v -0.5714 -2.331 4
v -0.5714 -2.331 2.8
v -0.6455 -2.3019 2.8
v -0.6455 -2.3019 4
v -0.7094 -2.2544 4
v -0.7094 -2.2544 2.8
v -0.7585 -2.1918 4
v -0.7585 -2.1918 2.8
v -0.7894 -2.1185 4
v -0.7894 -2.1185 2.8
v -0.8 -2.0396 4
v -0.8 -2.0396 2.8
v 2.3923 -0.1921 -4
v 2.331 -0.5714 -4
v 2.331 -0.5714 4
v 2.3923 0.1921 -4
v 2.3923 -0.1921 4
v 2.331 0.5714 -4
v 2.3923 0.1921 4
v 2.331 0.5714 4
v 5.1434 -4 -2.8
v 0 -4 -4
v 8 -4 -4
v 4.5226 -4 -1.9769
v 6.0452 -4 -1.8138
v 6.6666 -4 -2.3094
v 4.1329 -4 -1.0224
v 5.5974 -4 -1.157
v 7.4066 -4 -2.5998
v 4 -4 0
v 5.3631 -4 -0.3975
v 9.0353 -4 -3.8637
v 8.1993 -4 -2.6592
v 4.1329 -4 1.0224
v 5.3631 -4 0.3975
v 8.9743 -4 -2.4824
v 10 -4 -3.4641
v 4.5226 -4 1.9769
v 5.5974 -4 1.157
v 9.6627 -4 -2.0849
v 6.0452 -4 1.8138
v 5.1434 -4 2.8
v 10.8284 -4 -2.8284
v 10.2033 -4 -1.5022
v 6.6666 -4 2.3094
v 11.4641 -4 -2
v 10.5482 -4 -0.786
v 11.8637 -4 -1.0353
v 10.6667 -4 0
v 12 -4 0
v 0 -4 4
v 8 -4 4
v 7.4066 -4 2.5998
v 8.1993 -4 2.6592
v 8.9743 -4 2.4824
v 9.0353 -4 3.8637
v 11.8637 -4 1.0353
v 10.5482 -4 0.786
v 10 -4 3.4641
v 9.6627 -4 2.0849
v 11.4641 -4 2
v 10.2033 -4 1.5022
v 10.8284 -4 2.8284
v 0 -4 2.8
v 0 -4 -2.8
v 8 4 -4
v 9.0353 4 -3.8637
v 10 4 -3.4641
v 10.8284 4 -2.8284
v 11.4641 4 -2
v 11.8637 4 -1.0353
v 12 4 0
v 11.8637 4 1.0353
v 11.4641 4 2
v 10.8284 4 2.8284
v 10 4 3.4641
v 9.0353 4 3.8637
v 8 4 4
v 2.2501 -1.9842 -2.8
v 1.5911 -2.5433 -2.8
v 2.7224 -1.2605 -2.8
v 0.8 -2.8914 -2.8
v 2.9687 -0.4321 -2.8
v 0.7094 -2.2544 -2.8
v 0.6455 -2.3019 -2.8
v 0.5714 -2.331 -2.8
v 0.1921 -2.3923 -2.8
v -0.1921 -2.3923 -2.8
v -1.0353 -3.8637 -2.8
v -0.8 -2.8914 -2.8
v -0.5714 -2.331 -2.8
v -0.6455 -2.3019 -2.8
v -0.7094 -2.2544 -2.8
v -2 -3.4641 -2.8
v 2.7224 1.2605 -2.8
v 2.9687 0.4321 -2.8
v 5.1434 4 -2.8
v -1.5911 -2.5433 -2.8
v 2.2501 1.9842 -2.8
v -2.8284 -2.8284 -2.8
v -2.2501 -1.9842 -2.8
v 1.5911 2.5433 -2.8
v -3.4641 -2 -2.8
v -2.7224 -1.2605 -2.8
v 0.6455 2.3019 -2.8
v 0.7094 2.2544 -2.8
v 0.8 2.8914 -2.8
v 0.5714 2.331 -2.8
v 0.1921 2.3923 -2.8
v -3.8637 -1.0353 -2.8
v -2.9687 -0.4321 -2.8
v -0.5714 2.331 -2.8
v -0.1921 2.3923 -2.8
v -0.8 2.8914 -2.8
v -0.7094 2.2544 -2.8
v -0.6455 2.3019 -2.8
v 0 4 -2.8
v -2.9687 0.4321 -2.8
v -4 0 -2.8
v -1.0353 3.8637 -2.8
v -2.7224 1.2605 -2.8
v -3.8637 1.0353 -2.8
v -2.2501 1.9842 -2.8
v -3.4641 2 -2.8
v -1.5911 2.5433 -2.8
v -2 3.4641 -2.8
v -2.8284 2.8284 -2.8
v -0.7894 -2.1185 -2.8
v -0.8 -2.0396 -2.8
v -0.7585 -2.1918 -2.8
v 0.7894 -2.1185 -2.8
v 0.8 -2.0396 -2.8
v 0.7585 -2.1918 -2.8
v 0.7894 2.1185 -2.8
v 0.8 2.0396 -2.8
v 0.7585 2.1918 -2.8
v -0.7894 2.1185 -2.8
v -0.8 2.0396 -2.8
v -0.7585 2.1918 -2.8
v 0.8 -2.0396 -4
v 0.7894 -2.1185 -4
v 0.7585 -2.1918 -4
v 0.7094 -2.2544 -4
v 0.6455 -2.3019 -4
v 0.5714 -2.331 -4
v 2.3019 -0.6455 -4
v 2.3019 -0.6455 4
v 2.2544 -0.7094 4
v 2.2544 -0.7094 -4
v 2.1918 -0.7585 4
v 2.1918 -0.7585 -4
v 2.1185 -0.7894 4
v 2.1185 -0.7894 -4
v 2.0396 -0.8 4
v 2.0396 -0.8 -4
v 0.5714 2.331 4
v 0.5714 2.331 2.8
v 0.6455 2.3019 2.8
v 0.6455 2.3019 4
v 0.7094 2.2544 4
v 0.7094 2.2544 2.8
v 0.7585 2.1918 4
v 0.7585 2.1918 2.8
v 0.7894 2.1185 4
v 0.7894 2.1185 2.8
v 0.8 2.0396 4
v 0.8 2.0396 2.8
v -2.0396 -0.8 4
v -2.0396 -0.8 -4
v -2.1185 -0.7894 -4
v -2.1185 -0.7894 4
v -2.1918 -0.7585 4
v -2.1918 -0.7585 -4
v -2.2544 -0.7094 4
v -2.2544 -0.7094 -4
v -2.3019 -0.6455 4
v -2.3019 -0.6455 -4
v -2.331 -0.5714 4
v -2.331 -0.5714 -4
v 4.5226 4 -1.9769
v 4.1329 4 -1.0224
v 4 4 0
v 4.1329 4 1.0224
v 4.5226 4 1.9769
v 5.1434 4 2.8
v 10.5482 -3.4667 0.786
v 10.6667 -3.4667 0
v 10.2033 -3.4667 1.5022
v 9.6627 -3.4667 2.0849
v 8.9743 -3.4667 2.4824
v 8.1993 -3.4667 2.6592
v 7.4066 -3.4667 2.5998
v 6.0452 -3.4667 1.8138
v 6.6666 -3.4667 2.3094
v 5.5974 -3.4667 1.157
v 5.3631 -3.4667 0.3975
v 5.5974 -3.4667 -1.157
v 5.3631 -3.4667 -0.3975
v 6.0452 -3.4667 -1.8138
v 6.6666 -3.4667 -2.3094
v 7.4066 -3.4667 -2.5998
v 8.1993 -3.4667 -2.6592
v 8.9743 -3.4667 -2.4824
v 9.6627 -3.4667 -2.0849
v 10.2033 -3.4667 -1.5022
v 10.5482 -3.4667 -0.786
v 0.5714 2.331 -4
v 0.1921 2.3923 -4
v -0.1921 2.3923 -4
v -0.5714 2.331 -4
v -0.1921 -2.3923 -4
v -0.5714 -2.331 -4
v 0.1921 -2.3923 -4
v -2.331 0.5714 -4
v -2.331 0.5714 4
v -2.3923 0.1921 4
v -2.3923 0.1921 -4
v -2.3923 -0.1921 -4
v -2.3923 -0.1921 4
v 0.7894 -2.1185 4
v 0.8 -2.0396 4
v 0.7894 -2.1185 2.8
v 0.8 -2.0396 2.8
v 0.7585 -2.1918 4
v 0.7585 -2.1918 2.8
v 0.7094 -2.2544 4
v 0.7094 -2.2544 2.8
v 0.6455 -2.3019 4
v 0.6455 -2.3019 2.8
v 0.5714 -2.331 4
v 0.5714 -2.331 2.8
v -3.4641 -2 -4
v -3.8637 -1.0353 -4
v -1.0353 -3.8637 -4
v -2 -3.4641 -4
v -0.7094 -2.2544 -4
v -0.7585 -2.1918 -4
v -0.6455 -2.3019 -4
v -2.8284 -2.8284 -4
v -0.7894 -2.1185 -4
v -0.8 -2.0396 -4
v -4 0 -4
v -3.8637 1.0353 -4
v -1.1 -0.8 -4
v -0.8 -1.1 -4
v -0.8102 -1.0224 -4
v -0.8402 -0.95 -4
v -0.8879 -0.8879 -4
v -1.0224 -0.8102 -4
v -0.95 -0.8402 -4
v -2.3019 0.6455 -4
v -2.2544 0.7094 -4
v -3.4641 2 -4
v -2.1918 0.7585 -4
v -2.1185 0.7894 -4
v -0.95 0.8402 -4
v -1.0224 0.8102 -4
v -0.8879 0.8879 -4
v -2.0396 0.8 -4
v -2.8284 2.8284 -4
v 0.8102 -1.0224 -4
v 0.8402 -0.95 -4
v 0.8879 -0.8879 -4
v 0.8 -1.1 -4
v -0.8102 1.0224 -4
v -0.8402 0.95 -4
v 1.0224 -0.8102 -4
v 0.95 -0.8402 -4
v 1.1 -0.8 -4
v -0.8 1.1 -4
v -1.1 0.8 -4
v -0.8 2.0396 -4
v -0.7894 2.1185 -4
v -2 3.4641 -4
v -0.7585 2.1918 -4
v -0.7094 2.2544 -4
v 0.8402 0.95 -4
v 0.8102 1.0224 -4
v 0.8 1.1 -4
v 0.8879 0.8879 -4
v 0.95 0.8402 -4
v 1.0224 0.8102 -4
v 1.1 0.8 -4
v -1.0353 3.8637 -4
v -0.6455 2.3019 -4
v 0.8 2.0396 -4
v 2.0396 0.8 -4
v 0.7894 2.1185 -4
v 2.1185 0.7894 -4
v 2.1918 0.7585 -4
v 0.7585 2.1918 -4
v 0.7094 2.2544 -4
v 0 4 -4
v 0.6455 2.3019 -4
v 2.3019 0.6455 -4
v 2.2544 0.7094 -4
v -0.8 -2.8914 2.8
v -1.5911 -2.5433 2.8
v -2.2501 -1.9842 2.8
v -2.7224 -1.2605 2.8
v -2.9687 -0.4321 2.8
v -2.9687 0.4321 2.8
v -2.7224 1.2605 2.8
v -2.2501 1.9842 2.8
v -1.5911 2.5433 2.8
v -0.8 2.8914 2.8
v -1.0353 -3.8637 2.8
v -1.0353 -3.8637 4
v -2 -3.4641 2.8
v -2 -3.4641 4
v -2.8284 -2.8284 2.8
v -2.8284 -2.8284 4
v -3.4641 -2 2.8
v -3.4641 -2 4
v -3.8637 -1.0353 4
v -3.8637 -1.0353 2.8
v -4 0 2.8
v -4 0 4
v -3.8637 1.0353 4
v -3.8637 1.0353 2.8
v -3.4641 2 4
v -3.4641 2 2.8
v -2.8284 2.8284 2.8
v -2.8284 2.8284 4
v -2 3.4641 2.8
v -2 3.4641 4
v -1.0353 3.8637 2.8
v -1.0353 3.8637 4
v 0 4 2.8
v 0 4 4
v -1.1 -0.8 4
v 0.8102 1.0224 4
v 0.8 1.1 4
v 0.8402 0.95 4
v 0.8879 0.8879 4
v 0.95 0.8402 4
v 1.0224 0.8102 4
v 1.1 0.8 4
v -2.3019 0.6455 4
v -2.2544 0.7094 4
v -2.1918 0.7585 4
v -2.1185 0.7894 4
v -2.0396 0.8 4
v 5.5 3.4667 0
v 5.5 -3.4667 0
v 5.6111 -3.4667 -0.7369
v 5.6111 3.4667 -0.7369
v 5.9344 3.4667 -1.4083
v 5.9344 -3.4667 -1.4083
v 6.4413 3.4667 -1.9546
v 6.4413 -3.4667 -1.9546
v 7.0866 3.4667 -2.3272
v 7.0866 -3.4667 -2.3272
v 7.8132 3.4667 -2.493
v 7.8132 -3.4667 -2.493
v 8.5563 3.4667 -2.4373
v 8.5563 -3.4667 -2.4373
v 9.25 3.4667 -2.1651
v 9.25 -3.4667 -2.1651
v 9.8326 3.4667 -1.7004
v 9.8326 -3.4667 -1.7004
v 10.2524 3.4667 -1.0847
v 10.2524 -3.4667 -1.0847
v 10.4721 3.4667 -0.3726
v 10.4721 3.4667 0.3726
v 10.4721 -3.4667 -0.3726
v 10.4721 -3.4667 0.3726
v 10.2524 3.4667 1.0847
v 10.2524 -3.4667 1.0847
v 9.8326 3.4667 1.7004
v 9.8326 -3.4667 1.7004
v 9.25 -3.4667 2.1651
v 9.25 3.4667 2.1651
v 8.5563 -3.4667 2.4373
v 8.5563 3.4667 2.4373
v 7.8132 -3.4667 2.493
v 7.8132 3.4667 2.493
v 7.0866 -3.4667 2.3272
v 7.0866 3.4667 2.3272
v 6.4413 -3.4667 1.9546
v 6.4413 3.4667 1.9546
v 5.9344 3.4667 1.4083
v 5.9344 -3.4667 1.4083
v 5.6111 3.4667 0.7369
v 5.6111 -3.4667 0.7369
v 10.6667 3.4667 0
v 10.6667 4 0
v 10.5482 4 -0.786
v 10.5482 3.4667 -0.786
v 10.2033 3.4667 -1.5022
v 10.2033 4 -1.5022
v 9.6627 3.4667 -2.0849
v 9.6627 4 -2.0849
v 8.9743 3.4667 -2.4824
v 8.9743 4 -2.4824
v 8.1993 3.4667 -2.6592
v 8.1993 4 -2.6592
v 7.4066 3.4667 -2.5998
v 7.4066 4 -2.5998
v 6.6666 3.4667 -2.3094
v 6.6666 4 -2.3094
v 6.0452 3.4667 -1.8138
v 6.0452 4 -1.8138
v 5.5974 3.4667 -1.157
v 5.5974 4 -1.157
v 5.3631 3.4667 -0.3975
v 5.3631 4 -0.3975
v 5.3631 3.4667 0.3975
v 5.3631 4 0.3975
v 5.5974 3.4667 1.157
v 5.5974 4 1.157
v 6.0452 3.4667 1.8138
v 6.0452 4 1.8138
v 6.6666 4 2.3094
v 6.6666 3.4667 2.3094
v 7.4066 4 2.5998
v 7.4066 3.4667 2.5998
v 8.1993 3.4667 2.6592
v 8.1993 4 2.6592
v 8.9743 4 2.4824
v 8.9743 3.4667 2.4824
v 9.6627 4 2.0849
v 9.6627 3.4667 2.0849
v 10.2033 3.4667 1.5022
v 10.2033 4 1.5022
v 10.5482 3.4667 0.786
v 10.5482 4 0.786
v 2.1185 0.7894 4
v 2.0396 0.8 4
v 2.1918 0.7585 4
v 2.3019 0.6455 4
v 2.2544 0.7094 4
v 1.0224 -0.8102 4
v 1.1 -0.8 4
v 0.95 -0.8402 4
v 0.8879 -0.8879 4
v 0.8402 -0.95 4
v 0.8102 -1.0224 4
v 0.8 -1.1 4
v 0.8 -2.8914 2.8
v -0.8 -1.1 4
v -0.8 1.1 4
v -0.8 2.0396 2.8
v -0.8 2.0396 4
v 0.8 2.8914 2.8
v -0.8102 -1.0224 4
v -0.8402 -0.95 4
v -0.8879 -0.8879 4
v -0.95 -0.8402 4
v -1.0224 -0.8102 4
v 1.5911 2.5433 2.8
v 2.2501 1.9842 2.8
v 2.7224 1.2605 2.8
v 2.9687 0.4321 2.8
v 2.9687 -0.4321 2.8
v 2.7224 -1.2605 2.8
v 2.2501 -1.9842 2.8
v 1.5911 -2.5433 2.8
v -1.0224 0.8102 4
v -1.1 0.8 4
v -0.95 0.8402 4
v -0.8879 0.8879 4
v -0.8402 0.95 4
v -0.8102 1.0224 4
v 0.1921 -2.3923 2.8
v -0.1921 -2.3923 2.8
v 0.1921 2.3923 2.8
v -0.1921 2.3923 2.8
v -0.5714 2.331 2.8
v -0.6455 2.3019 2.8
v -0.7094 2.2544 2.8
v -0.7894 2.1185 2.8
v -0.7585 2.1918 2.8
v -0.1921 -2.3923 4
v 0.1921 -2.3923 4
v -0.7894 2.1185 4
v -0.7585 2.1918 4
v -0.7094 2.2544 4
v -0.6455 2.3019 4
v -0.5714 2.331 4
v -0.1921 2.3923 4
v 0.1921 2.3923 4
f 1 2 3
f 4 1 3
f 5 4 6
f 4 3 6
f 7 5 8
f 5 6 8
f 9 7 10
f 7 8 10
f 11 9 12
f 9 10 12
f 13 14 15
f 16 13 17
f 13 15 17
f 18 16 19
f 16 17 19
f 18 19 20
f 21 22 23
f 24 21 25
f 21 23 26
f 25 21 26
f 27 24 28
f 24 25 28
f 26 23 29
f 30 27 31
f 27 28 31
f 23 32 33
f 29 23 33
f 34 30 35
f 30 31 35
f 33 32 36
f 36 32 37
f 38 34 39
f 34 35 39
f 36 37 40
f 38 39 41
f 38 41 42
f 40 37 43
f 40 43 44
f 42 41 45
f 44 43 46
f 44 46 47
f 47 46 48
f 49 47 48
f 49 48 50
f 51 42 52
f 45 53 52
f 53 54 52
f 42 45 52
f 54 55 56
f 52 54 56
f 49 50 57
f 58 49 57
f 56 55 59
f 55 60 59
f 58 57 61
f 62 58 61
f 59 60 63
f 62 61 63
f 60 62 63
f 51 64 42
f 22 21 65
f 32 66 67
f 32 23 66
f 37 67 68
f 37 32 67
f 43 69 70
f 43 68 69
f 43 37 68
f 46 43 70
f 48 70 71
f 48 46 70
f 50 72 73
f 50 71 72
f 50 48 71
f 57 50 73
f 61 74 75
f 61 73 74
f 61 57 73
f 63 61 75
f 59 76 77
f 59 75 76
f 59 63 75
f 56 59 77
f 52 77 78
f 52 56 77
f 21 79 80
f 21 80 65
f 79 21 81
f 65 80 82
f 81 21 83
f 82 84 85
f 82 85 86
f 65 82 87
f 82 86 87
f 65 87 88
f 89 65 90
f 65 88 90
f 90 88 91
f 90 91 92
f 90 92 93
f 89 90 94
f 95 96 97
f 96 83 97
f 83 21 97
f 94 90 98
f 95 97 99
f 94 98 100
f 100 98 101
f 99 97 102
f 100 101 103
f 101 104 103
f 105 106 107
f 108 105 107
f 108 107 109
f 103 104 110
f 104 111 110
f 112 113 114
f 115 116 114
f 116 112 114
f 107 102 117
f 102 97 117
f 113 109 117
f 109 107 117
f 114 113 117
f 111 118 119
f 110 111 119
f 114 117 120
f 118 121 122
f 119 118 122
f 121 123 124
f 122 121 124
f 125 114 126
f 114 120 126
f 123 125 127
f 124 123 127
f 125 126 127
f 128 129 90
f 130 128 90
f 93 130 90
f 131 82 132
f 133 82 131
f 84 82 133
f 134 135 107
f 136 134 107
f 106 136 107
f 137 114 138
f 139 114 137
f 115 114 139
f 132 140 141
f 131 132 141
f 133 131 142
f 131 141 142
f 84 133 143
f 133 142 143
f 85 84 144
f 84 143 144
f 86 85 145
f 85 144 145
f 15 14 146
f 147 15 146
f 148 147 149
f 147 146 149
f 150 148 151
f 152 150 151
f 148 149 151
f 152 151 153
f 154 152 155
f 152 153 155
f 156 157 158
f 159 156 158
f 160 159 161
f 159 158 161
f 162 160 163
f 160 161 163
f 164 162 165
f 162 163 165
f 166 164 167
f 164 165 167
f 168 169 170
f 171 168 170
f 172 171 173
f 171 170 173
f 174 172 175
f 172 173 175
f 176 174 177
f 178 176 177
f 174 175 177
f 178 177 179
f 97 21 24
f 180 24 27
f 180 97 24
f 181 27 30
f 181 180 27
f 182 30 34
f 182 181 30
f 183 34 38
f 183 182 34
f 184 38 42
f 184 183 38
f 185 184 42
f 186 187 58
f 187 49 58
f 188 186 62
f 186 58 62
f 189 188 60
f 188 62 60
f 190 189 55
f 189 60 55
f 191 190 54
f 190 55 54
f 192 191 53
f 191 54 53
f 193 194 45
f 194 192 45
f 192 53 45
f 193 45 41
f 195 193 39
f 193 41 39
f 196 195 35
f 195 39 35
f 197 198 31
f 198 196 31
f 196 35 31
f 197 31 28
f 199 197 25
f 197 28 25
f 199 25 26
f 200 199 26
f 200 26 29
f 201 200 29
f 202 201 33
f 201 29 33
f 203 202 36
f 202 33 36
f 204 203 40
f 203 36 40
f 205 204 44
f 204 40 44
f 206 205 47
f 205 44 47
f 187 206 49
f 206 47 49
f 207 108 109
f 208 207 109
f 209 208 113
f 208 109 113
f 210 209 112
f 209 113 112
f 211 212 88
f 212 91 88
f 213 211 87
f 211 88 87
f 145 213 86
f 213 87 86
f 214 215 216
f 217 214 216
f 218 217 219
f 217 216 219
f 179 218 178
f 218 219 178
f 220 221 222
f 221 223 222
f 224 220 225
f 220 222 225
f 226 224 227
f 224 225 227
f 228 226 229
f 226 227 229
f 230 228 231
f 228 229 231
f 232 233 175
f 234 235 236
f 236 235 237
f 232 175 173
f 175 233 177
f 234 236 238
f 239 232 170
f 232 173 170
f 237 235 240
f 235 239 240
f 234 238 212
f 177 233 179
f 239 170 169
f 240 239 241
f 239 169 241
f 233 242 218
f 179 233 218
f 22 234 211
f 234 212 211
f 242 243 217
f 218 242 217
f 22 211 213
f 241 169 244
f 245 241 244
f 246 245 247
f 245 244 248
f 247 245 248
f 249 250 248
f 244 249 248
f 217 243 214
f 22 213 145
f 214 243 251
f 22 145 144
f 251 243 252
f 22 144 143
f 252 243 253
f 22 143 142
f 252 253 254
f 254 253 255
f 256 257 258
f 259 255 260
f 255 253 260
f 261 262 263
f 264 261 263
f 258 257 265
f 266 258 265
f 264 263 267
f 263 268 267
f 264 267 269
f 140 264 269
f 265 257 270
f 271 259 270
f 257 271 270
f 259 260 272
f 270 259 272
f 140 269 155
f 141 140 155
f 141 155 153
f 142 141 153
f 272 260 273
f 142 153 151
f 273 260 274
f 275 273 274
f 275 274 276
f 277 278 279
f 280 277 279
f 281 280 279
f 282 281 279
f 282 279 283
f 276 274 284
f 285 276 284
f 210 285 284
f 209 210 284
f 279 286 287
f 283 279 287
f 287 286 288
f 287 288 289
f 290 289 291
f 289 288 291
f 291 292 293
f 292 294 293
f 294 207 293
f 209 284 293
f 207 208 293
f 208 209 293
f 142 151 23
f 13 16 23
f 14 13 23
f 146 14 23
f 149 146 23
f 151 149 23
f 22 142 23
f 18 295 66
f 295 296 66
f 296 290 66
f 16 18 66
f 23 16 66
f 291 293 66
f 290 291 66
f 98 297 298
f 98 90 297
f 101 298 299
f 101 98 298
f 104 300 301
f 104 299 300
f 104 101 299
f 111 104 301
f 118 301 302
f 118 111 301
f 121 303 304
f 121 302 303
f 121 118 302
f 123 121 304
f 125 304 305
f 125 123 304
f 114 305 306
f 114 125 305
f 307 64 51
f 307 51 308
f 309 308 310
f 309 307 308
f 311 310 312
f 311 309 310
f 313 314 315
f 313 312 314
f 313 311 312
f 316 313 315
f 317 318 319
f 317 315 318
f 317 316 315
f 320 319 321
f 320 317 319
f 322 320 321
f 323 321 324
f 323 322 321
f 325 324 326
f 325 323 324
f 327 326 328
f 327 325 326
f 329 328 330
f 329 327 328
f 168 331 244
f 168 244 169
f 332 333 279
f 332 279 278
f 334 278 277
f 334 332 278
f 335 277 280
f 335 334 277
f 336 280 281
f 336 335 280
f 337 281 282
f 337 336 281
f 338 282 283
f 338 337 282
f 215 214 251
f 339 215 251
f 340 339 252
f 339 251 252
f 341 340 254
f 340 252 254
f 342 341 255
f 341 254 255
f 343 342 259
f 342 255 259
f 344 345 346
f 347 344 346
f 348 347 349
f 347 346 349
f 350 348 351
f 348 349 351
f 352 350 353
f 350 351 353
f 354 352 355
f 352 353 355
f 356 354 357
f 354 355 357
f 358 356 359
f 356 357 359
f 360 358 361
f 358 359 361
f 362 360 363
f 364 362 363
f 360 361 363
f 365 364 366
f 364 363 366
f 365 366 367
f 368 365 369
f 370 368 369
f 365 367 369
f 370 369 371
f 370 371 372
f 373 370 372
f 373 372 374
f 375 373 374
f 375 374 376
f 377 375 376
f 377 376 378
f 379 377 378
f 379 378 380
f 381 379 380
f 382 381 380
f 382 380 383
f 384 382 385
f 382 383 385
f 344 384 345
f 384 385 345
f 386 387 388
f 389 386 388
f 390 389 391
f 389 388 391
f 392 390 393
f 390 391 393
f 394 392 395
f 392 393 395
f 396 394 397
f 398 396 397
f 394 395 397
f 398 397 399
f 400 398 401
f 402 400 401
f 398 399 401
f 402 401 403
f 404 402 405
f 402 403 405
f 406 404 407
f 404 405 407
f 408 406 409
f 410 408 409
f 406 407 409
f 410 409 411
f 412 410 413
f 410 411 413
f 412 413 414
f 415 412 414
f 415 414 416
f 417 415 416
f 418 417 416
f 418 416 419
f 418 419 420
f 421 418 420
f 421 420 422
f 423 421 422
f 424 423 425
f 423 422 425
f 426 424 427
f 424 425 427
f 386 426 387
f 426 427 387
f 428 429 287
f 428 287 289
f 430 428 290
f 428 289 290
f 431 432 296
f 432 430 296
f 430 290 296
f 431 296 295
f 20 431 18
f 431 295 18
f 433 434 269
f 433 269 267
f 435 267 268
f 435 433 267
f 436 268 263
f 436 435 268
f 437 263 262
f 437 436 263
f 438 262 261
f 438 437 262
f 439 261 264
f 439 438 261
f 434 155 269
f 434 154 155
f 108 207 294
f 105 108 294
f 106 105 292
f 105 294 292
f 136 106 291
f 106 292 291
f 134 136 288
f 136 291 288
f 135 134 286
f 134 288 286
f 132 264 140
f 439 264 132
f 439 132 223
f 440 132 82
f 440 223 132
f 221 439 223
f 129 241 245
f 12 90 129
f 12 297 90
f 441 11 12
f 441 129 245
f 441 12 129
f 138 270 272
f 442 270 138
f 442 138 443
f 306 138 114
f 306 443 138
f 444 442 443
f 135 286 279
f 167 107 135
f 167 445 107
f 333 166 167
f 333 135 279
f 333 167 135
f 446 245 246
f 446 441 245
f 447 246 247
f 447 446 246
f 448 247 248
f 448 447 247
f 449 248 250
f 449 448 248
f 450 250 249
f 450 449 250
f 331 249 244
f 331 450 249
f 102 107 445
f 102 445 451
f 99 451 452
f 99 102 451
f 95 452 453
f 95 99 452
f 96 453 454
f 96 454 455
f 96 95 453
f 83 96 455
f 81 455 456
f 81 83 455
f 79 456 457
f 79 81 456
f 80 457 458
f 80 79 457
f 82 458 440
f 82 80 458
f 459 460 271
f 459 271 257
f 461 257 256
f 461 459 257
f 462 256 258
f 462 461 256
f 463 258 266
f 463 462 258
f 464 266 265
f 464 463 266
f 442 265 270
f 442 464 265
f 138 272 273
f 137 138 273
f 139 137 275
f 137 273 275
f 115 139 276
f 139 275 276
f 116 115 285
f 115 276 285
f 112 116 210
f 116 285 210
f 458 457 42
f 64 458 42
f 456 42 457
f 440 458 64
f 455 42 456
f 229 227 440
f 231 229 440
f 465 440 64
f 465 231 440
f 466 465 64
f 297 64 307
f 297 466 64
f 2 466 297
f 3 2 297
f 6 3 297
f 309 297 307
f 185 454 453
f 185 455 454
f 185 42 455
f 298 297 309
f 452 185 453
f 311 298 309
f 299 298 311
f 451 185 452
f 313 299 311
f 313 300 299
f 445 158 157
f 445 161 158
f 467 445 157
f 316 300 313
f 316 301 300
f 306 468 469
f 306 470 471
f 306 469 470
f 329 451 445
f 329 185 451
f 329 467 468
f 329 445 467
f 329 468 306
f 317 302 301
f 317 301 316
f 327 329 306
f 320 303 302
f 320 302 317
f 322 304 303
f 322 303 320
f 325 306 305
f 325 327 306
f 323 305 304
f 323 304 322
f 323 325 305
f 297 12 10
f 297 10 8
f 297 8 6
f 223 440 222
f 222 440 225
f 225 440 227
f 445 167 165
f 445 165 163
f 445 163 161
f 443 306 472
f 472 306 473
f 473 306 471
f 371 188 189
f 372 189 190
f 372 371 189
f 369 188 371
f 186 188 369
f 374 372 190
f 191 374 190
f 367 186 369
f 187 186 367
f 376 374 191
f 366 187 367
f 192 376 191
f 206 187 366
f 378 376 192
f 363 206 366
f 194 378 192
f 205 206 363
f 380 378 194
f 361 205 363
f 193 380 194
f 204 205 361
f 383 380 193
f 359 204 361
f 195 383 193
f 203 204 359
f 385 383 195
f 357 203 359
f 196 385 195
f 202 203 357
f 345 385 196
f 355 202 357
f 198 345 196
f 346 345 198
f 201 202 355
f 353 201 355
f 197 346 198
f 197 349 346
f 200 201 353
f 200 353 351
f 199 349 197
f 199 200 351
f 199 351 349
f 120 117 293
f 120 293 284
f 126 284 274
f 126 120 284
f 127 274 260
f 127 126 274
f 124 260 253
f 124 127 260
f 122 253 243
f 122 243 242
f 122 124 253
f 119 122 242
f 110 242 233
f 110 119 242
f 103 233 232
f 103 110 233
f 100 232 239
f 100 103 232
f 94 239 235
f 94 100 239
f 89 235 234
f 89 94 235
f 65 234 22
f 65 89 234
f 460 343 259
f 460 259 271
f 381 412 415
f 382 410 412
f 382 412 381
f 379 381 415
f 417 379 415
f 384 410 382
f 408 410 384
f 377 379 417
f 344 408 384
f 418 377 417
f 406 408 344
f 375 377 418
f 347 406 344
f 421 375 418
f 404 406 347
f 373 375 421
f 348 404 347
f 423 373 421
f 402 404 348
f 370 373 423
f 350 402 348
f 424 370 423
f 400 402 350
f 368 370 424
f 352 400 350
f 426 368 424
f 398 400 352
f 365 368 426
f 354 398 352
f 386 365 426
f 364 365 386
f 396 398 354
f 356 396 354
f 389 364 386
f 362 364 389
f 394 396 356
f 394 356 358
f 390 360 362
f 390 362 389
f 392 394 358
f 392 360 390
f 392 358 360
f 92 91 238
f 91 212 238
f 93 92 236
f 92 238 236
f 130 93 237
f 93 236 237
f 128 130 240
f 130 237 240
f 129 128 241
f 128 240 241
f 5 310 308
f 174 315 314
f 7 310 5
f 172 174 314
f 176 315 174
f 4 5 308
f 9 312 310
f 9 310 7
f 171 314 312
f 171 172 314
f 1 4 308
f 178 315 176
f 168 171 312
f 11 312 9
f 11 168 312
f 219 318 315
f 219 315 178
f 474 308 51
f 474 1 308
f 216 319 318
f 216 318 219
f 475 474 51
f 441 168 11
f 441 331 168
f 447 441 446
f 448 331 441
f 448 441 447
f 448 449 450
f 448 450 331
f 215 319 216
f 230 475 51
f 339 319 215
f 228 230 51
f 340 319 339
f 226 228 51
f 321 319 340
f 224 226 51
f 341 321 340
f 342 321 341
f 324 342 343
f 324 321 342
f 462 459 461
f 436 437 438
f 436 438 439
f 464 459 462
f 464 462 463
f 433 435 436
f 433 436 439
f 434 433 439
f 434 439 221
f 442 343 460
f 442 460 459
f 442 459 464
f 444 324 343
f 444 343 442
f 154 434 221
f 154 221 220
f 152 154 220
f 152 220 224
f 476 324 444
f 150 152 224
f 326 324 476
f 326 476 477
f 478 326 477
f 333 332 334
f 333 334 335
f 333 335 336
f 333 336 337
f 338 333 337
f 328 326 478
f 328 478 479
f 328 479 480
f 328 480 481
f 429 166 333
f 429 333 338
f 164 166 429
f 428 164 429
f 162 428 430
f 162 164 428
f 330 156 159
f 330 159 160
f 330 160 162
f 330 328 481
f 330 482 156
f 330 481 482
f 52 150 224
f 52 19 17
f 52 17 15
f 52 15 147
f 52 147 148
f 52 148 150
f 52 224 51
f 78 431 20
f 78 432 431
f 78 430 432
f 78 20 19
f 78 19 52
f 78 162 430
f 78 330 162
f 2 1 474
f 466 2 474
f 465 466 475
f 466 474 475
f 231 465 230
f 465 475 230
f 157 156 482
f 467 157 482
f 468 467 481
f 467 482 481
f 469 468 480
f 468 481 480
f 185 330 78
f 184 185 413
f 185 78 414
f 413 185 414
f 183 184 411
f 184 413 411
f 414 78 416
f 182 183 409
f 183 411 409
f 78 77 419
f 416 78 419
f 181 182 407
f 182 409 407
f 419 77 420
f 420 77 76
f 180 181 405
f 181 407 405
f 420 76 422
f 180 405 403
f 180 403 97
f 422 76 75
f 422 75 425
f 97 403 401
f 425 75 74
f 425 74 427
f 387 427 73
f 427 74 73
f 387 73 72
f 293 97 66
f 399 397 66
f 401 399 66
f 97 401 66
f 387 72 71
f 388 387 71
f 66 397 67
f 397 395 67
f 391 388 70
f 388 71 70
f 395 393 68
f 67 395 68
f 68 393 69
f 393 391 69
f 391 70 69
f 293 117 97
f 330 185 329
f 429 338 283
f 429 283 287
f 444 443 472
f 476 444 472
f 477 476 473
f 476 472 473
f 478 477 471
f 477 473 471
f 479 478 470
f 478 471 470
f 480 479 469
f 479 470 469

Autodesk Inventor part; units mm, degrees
ref_plane "XZ Plane" through (0, 0, 0) normal (0, 1, 0) x (-1, 0, 0)
sketch "Sketch1" plane through (0, 0, 0) normal (0, 0, 1) x (1, 0, 0)
  circle A0 centre (0, 0) radius 4
  dimension "d0" = 8
extrude "Extrusion1" add sketch "Sketch1" along normal mid plane 8
sketch "Sketch2" plane through (0, 0, 4) normal (0, 0, 1) x (1, 0, 0)
  circle A0 centre (0, 0) radius 2.4
  line L0 (-2.2627, 0.8) -> (-0.8, 0.8)
  line L1 (-0.8, 0.8) -> (-0.8, 2.2627)
  line L2 (0.8, 2.2627) -> (0.8, 0.8)
  line L3 (0.8, 0.8) -> (2.2627, 0.8)
  line L4 (2.2627, -0.8) -> (0.8, -0.8)
  line L5 (0.8, -0.8) -> (0.8, -2.2627)
  line L6 (-0.8, -2.2627) -> (-0.8, -0.8)
  line L7 (-0.8, -0.8) -> (-2.2627, -0.8)
  dimension "d3" = 4.8
  dimension "d4" = 1.6
extrude "Extrusion2" cut sketch "Sketch2" against normal through all contours A0 L4 L5 L6 L7 L0 L1 L2 L3
ref_plane "Work Plane1" through (0, 0, -2.8) normal (0, 0, -1) x (-1, 0, 0)
sketch "Sketch3" plane through (0, 0, -2.8) normal (0, 0, -1) x (-1, 0, 0)
  circle A0 centre (0, 0) radius 4 projected
  circle A1 centre (0, 0) radius 4 projected
  circle A2 centre (0, 0) radius 3
  dimension "d8" = 6
extrude "Extrusion3" cut sketch "Sketch3" against normal blind 5.6
sketch "Sketch5" plane through (0, 0, 0) normal (0, 1, 0) x (-1, 0, 0)
  line L0 (-0.8, 4) -> (-0.8, -4) projected
  line L1 (0.8, 4) -> (0.8, -4) projected
  line L2 (4, 2.8) -> (-4, 2.8) projected
  line L3 (-0.8, -2.8) -> (0.8, -2.8)
  line L4 (0.8, -2.8) -> (0.8, 2.8)
  line L5 (0.8, 2.8) -> (-0.8, 2.8)
  line L6 (-0.8, 2.8) -> (-0.8, -2.8)
  point P0 (0, 0)
  point P1 (-1.518, -3.6)
  point P2 (4, -2.8)
  point P3 (4, -2.8)
extrude "Extrusion5" cut sketch "Sketch5" along normal through all both and the other way through all
fillet "Fillet1" radius 0.3 16 edges at (-0.8, 0.8, 0) (-0.8, -0.8, 0) (0.8, -0.8, 0) (0.8, 0.8, 0) (-2.2627, -0.8, 0) (-2.2627, 0.8, 0) (-0.8, 2.2627, 3.4) (0.8, 2.2627, 3.4) (2.2627, 0.8, 0) (2.2627, -0.8, 0) (0.8, -2.2627, 3.4) (-0.8, -2.2627, 3.4) (0.8, 2.2627, -3.4) (-0.8, 2.2627, -3.4) (0.8, -2.2627, -3.4) (-0.8, -2.2627, -3.4)
sketch "Sketch6" plane through (0, 0, 0) normal (0, 1, 0) x (-1, 0, 0)
  circle A0 centre (-8, 0) radius 2.5
  circle A1 centre (-8, 0) radius 4
  line L0 (-4, 2.8) -> (-4, 4)
  line L1 (-4, -4) -> (-4, -2.8)
  line L2 (-8, 4) -> (-8, -4) construction
  point P0 (0, 0)
  dimension "d22" = 5
  dimension "d23" = 8
  dimension "d24" = 8
extrude "Extrusion6" add sketch "Sketch6" along normal mid plane 8
sketch "Sketch7" plane through (8, 4, 0) normal (0, 1, 0) x (1, 0, 0)
  circle A0 centre (0, 0) radius 2.5 projected
  circle A1 centre (0, 0) radius 4 projected
  circle A2 centre (0, 0) radius 2.6667
  point P0 (-8, 0)
  dimension "d27" = 5.3333
extrude "Extrusion7" cut sketch "Sketch7" against normal blind 0.5333 contours A2
mirror "Mirror1" about plane through (0, 0, 0) normal (0, 1, 0) of "Extrusion7"
ref_plane "Work Plane2" through (8, 0, 0) normal (1, 0, 0) x (0, 1, 0)
sketch "Sketch8" plane through (8, 0, 0) normal (1, 0, 0) x (0, 1, 0)
  line L0 (-4, -2.6667) -> (-4, 2.6667) projected
  line L1 (-4, -4) -> (-4, 4) projected
  line L2 (4, 2.6667) -> (4, -2.6667) projected
  line L3 (4, 4) -> (4, -4) projected
  line L4 (4, 4) -> (-4, 4)
  line L5 (-4, 4) -> (-4, 2.8)
  line L6 (-4, 2.8) -> (4, 2.8)
  line L7 (4, 2.8) -> (4, 4)
  line L8 (-4, -4) -> (4, -4)
  line L9 (4, -4) -> (4, -2.8)
  line L10 (4, -2.8) -> (-4, -2.8)
  line L11 (-4, -2.8) -> (-4, -4)
  dimension "d36" = 1.2
extrude "Extrusion8" add sketch "Sketch8" against normal up to surface contours L10 L3 L8 L1 | L1 L4 L3 L6
properties part number "6536" material "Steel"
